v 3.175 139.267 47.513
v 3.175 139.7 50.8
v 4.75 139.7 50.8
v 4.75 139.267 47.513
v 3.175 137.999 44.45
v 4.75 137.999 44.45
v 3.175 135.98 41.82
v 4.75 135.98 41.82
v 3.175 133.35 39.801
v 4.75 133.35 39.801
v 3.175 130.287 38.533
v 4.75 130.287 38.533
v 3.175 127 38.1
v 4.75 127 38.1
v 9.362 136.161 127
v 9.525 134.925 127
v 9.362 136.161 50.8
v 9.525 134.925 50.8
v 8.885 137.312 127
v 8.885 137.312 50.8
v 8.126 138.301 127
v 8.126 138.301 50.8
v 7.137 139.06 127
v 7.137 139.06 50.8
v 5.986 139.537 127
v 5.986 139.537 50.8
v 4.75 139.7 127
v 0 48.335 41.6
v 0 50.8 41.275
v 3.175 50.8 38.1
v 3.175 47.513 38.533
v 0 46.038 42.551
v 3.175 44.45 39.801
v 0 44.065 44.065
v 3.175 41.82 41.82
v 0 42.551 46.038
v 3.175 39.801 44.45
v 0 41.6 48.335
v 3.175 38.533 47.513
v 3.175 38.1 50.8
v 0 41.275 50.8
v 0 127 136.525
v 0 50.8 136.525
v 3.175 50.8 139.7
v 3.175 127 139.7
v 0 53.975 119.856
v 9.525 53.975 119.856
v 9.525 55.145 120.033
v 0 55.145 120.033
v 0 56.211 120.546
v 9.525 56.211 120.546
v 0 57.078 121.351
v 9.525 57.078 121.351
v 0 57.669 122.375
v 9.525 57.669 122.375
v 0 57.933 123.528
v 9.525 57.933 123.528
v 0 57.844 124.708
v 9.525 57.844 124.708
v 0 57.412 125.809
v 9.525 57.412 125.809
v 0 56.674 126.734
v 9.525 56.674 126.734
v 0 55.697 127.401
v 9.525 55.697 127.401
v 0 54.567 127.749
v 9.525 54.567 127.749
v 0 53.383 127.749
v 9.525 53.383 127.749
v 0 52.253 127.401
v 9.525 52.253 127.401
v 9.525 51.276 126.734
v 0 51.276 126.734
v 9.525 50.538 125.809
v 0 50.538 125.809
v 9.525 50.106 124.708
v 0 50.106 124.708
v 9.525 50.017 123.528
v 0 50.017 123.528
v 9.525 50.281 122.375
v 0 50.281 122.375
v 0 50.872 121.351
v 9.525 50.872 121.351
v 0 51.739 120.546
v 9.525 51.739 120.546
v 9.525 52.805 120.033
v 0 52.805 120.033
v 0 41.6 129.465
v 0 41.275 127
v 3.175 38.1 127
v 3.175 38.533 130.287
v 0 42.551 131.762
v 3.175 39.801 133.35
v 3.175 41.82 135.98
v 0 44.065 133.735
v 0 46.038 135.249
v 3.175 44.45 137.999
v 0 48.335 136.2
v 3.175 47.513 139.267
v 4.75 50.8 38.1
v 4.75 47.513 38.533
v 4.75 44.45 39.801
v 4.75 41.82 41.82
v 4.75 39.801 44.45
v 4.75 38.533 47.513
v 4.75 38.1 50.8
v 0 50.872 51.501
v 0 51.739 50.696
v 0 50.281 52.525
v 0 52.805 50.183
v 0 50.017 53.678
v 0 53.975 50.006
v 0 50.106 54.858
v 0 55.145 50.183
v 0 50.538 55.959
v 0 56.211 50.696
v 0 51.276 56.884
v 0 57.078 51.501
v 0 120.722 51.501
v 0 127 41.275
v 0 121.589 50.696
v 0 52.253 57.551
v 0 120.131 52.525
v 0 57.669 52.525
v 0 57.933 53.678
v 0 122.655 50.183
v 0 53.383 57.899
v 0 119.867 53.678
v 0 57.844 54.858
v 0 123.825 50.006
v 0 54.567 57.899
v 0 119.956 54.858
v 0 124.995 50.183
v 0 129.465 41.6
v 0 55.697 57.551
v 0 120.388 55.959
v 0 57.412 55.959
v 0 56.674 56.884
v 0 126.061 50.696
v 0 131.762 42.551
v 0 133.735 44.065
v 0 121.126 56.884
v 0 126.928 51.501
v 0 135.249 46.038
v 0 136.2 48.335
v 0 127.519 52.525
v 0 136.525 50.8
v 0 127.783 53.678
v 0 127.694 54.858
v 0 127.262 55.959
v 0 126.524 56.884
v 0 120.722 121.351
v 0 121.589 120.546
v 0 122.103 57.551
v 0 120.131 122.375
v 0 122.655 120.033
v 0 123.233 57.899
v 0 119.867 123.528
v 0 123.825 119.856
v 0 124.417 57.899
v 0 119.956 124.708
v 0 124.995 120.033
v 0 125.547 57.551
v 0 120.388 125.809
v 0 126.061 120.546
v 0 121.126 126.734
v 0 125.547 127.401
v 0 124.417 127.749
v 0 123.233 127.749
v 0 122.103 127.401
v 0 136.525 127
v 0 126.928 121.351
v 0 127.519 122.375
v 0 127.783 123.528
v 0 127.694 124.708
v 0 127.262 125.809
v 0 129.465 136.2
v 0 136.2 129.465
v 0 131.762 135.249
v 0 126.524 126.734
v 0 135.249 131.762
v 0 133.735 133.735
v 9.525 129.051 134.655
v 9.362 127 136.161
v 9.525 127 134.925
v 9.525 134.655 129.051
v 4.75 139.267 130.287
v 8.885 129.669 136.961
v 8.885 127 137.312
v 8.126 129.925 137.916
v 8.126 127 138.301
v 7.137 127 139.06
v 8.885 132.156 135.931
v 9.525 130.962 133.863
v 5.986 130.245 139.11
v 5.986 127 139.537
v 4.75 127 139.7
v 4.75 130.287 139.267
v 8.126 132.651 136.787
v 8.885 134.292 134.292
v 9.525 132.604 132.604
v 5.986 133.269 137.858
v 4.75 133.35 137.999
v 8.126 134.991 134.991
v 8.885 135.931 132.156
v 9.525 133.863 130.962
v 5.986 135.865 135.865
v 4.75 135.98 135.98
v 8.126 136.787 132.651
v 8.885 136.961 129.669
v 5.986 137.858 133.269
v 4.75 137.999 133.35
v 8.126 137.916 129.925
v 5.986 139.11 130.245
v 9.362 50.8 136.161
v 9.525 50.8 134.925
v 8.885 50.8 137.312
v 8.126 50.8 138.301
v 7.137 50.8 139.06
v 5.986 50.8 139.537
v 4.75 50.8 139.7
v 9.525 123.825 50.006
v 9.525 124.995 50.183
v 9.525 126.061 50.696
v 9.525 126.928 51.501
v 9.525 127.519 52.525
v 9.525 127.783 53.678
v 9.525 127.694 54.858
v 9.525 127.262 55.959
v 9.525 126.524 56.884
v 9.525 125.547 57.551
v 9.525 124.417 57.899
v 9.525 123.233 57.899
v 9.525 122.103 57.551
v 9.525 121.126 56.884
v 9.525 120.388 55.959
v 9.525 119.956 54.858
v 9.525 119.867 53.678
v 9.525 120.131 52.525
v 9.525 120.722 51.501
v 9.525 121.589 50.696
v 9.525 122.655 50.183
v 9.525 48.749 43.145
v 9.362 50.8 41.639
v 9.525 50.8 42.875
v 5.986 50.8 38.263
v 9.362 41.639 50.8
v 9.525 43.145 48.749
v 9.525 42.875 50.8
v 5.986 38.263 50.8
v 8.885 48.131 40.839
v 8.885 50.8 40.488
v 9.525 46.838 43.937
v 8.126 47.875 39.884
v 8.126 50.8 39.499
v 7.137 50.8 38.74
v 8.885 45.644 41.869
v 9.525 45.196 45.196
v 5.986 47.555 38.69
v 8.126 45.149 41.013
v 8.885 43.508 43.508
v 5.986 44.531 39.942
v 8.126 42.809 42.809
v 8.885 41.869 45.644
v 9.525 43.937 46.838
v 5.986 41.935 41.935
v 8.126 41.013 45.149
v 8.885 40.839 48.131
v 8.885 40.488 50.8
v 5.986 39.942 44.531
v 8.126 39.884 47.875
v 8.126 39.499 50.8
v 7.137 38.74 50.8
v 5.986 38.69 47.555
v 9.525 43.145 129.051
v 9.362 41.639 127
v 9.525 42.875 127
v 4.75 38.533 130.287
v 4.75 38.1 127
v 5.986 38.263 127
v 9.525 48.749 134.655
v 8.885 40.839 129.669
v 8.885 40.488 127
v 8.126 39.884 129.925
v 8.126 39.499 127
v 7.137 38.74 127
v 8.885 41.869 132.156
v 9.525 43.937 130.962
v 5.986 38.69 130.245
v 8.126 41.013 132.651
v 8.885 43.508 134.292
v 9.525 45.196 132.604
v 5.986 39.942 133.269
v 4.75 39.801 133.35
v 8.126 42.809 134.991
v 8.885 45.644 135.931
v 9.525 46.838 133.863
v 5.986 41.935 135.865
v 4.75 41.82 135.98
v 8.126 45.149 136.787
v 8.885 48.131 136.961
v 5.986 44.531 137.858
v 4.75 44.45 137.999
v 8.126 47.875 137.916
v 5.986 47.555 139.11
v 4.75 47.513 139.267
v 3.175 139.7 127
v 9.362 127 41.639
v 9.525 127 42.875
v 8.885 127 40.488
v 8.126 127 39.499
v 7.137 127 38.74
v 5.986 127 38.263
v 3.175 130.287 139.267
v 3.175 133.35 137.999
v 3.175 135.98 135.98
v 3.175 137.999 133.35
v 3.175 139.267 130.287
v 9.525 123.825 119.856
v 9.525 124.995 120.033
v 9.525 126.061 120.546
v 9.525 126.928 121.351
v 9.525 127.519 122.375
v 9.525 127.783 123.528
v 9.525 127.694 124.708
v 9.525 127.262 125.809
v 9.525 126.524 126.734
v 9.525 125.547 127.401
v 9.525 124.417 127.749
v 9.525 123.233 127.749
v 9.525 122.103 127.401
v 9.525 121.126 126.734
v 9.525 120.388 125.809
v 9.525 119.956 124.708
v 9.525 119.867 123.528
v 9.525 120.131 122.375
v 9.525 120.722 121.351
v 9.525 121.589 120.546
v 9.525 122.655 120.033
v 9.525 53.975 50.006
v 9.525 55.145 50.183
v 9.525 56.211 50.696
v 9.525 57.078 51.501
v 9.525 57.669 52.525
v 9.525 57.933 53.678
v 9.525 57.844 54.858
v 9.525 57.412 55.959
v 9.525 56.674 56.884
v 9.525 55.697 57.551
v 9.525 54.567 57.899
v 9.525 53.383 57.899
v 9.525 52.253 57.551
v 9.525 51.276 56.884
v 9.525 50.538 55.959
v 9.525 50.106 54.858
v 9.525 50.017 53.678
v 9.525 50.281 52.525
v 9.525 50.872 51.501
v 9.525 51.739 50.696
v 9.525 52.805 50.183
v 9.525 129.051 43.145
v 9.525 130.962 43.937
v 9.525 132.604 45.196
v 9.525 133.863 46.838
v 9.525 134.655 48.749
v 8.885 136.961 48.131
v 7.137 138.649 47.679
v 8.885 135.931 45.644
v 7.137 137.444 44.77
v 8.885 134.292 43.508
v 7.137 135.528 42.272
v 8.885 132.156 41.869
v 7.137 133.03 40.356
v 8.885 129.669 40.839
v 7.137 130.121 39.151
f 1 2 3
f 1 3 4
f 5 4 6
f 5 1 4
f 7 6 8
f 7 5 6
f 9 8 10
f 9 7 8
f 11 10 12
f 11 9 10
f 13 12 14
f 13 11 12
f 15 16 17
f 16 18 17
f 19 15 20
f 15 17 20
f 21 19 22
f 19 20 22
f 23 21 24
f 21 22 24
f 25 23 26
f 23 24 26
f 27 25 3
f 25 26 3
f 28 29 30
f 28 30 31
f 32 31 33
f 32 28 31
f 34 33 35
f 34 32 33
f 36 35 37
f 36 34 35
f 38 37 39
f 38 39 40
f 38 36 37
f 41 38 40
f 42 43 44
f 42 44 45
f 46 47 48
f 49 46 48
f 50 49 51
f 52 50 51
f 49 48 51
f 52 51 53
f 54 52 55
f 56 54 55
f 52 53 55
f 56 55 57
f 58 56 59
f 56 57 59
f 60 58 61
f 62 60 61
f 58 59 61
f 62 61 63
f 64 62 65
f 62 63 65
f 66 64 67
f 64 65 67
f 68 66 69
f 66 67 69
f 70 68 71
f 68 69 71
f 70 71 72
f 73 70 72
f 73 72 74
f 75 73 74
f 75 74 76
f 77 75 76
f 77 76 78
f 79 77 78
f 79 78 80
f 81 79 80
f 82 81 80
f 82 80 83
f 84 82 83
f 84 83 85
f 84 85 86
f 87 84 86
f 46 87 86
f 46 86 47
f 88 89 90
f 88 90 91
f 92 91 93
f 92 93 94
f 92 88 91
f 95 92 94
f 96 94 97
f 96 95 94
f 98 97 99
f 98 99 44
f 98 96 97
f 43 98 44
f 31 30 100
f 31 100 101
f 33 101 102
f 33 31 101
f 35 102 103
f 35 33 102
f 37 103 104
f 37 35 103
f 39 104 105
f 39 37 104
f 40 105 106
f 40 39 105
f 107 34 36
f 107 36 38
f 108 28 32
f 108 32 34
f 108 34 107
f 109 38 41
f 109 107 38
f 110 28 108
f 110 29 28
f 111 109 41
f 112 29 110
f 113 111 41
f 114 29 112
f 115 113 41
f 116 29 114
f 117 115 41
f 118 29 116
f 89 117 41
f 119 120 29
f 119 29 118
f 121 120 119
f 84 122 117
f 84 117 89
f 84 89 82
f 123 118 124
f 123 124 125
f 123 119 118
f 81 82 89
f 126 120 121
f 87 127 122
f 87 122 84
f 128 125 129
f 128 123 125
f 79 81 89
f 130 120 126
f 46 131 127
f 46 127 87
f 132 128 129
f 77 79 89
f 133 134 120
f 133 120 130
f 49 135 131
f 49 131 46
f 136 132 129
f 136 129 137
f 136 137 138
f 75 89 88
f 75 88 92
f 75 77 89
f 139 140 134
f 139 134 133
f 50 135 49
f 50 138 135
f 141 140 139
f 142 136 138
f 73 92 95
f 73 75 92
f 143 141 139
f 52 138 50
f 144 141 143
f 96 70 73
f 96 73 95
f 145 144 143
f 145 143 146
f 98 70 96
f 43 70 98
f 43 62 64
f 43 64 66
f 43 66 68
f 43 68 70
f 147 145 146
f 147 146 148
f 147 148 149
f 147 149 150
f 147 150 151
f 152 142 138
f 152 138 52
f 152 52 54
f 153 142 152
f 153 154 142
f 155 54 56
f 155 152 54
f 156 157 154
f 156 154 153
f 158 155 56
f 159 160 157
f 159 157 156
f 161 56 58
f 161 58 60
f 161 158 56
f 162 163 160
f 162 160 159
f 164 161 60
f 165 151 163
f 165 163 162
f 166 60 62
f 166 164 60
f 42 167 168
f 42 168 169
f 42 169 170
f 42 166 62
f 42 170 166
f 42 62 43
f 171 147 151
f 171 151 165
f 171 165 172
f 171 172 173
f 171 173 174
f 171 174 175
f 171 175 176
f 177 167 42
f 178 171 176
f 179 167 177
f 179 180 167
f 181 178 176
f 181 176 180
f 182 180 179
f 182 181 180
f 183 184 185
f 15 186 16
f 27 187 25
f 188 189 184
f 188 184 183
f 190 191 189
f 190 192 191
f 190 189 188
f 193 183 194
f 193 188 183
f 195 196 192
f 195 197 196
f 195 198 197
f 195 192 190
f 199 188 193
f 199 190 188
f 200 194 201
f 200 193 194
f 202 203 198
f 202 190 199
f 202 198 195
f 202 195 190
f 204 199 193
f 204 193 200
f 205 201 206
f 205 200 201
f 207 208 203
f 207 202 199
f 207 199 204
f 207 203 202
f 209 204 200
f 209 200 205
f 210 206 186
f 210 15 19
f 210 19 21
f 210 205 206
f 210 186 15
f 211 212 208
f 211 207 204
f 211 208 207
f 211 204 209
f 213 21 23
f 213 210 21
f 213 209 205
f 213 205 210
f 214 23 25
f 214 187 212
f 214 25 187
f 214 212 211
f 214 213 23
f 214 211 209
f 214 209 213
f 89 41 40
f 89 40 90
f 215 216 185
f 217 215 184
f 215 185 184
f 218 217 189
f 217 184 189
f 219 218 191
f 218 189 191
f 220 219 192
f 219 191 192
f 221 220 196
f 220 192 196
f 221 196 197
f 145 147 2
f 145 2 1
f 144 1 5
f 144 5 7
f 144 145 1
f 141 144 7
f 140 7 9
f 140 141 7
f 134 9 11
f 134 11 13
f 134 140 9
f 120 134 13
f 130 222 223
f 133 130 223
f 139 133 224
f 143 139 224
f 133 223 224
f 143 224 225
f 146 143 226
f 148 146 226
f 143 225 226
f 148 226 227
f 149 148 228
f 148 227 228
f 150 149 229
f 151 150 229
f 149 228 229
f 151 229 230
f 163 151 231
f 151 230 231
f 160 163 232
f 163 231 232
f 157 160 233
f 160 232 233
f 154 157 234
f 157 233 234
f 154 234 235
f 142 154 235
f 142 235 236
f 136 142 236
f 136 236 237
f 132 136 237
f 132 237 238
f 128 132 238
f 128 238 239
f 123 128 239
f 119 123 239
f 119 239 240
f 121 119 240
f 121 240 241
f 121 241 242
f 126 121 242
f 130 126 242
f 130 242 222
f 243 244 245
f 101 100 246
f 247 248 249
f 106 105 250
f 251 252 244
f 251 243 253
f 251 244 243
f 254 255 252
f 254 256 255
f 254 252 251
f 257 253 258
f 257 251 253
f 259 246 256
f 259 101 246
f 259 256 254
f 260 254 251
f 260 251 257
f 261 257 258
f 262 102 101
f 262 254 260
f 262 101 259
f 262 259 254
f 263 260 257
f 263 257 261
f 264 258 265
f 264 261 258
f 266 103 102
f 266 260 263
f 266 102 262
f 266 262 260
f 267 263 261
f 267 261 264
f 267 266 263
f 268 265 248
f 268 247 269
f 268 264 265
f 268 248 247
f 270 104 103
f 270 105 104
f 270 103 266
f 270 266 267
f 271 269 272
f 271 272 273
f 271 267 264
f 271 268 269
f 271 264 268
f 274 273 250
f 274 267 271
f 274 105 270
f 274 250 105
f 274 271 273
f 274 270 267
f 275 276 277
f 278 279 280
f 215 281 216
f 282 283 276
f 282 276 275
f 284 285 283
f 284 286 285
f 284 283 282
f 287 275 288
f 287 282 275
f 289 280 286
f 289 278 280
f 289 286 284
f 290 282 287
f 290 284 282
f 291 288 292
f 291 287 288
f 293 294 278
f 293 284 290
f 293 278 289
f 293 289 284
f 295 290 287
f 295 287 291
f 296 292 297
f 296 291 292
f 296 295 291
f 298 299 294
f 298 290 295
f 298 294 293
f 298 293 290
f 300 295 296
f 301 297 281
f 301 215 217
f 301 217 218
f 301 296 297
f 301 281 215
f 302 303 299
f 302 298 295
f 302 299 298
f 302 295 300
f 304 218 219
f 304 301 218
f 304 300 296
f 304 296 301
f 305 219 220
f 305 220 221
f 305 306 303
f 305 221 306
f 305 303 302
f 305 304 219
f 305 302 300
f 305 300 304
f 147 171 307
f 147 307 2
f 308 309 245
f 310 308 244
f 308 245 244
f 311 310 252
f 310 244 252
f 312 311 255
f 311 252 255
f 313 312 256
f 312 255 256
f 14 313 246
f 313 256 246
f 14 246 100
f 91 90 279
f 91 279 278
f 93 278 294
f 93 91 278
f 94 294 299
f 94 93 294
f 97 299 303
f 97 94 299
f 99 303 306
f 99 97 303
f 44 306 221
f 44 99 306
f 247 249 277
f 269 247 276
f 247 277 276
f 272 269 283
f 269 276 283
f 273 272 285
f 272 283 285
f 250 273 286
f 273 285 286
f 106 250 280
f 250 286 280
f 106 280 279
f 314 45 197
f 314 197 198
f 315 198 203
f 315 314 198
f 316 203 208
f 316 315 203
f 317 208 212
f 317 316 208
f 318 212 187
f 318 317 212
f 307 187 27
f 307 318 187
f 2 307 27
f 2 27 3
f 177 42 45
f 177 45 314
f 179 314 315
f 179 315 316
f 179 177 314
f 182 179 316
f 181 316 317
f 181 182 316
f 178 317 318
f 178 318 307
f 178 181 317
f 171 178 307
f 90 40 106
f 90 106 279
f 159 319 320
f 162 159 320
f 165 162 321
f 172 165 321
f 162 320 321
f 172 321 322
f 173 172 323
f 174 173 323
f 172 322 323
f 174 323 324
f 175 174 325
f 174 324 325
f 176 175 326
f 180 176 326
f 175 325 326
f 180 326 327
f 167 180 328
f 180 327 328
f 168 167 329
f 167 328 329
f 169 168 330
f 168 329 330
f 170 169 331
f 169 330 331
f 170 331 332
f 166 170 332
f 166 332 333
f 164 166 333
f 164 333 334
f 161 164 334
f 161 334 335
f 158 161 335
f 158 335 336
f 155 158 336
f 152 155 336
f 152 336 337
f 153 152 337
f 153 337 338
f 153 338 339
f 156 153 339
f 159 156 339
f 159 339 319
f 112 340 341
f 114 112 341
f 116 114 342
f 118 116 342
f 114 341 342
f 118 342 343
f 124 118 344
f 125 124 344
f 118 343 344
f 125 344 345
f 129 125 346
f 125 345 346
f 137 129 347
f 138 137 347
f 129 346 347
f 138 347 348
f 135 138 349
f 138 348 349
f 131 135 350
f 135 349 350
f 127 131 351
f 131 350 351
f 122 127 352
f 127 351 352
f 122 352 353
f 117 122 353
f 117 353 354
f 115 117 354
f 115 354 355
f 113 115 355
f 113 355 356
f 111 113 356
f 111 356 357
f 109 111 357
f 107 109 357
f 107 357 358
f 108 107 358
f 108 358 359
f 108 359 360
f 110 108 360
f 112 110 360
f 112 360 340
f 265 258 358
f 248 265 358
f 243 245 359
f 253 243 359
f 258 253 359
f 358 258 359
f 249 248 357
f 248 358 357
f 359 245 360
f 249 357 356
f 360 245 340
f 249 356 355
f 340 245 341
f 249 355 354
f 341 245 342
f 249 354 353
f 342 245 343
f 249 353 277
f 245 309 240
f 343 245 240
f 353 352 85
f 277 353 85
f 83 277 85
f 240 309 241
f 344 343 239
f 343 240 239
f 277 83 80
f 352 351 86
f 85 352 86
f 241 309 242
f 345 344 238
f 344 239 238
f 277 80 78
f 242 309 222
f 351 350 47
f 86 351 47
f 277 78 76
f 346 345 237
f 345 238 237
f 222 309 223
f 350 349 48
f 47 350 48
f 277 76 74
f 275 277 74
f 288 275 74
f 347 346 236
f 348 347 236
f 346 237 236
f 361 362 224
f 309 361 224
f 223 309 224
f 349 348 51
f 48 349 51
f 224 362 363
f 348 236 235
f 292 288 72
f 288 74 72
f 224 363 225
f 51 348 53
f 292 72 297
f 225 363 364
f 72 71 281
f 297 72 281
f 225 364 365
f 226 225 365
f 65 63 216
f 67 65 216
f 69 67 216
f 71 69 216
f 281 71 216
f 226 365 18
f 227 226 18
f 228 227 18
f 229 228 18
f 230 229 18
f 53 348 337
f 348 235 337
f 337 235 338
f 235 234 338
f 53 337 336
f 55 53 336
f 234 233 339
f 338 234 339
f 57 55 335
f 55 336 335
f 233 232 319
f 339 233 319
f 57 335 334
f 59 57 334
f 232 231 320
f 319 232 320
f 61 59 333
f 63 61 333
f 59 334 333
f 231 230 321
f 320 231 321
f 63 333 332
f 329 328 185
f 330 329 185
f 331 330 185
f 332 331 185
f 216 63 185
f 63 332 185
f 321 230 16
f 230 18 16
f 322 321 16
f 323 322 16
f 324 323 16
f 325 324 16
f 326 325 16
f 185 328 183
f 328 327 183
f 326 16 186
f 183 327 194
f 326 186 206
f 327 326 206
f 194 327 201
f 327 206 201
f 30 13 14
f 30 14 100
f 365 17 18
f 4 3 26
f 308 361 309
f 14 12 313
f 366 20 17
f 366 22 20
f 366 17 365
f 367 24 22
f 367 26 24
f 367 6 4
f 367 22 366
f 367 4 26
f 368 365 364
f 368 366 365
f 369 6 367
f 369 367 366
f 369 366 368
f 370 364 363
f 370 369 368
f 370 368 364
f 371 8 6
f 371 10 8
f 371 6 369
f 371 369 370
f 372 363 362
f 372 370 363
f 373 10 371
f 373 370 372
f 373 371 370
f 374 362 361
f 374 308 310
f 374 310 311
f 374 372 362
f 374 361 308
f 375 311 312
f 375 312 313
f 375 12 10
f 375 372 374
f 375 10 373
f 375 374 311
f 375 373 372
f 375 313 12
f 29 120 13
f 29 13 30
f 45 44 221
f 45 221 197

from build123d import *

# Parameters (mm, degrees)
BASE_EXTRUDE_DEPTH = 9.525
CHAMFER1_SIZE      = 3.175
FILLET1_R          = 4.7752
SKETCH2_R          = 3.96875
CUT_EXTRUDE1_DEPTH = 25.4


with BuildPart() as part:
    # Sketch1 → Base-Extrude (new body)
    with BuildSketch(Plane(origin=(0, 0, 0), x_dir=(0, 0, -1), z_dir=(1, 0, 0))):
        with BuildLine():
            Line((-127, 139.7), (-50.8, 139.7))
            ThreePointArc((-50.8, 139.7), (-41.819743879, 135.980256121), (-38.1, 127))
            Line((-38.1, 127), (-38.1, 50.8))
            ThreePointArc((-38.1, 50.8), (-41.819743879, 41.819743879), (-50.8, 38.1))
            Line((-50.8, 38.1), (-127, 38.1))
            ThreePointArc((-127, 38.1), (-135.980256121, 41.819743879), (-139.7, 50.8))
            Line((-139.7, 50.8), (-139.7, 127))
            ThreePointArc((-139.7, 127), (-135.980256121, 135.980256121), (-127, 139.7))
        make_face()
    extrude(amount=BASE_EXTRUDE_DEPTH)

    # Chamfer1
    chamfer1_edges = [part.edges().sort_by_distance(p)[0] for p in [
        (0, 38.1, 88.9),
        (0, 41.819743879, 135.980256121),
        (0, 88.9, 139.7),
        (0, 135.980256121, 135.980256121),
        (0, 139.7, 88.9),
        (0, 135.980256121, 41.819743879),
        (0, 88.9, 38.1),
        (0, 41.819743879, 41.819743879),
    ]]
    chamfer(chamfer1_edges, length=CHAMFER1_SIZE)

    # Fillet1
    fillet1_edges = [part.edges().sort_by_distance(p)[0] for p in [
        (9.525, 135.980256121, 41.819743879),
        (9.525, 139.7, 88.9),
        (9.525, 135.980256121, 135.980256121),
        (9.525, 88.9, 139.7),
        (9.525, 41.819743879, 135.980256121),
        (9.525, 38.1, 88.9),
        (9.525, 41.819743879, 41.819743879),
        (9.525, 88.9, 38.1),
    ]]
    fillet(fillet1_edges, radius=FILLET1_R)

    # Sketch2 → Cut-Extrude1 (cut)
    with BuildSketch(Plane(origin=(9.525, 0, 0), x_dir=(0, 0, -1), z_dir=(1, 0, 0))):
        with Locations((-53.975, 53.975)):
            Circle(SKETCH2_R)
        with Locations((-53.975, 123.825)):
            Circle(SKETCH2_R)
        with Locations((-123.825, 123.825)):
            Circle(SKETCH2_R)
        with Locations((-123.825, 53.975)):
            Circle(SKETCH2_R)
    extrude(amount=-CUT_EXTRUDE1_DEPTH, mode=Mode.SUBTRACT)


solid = part.part
